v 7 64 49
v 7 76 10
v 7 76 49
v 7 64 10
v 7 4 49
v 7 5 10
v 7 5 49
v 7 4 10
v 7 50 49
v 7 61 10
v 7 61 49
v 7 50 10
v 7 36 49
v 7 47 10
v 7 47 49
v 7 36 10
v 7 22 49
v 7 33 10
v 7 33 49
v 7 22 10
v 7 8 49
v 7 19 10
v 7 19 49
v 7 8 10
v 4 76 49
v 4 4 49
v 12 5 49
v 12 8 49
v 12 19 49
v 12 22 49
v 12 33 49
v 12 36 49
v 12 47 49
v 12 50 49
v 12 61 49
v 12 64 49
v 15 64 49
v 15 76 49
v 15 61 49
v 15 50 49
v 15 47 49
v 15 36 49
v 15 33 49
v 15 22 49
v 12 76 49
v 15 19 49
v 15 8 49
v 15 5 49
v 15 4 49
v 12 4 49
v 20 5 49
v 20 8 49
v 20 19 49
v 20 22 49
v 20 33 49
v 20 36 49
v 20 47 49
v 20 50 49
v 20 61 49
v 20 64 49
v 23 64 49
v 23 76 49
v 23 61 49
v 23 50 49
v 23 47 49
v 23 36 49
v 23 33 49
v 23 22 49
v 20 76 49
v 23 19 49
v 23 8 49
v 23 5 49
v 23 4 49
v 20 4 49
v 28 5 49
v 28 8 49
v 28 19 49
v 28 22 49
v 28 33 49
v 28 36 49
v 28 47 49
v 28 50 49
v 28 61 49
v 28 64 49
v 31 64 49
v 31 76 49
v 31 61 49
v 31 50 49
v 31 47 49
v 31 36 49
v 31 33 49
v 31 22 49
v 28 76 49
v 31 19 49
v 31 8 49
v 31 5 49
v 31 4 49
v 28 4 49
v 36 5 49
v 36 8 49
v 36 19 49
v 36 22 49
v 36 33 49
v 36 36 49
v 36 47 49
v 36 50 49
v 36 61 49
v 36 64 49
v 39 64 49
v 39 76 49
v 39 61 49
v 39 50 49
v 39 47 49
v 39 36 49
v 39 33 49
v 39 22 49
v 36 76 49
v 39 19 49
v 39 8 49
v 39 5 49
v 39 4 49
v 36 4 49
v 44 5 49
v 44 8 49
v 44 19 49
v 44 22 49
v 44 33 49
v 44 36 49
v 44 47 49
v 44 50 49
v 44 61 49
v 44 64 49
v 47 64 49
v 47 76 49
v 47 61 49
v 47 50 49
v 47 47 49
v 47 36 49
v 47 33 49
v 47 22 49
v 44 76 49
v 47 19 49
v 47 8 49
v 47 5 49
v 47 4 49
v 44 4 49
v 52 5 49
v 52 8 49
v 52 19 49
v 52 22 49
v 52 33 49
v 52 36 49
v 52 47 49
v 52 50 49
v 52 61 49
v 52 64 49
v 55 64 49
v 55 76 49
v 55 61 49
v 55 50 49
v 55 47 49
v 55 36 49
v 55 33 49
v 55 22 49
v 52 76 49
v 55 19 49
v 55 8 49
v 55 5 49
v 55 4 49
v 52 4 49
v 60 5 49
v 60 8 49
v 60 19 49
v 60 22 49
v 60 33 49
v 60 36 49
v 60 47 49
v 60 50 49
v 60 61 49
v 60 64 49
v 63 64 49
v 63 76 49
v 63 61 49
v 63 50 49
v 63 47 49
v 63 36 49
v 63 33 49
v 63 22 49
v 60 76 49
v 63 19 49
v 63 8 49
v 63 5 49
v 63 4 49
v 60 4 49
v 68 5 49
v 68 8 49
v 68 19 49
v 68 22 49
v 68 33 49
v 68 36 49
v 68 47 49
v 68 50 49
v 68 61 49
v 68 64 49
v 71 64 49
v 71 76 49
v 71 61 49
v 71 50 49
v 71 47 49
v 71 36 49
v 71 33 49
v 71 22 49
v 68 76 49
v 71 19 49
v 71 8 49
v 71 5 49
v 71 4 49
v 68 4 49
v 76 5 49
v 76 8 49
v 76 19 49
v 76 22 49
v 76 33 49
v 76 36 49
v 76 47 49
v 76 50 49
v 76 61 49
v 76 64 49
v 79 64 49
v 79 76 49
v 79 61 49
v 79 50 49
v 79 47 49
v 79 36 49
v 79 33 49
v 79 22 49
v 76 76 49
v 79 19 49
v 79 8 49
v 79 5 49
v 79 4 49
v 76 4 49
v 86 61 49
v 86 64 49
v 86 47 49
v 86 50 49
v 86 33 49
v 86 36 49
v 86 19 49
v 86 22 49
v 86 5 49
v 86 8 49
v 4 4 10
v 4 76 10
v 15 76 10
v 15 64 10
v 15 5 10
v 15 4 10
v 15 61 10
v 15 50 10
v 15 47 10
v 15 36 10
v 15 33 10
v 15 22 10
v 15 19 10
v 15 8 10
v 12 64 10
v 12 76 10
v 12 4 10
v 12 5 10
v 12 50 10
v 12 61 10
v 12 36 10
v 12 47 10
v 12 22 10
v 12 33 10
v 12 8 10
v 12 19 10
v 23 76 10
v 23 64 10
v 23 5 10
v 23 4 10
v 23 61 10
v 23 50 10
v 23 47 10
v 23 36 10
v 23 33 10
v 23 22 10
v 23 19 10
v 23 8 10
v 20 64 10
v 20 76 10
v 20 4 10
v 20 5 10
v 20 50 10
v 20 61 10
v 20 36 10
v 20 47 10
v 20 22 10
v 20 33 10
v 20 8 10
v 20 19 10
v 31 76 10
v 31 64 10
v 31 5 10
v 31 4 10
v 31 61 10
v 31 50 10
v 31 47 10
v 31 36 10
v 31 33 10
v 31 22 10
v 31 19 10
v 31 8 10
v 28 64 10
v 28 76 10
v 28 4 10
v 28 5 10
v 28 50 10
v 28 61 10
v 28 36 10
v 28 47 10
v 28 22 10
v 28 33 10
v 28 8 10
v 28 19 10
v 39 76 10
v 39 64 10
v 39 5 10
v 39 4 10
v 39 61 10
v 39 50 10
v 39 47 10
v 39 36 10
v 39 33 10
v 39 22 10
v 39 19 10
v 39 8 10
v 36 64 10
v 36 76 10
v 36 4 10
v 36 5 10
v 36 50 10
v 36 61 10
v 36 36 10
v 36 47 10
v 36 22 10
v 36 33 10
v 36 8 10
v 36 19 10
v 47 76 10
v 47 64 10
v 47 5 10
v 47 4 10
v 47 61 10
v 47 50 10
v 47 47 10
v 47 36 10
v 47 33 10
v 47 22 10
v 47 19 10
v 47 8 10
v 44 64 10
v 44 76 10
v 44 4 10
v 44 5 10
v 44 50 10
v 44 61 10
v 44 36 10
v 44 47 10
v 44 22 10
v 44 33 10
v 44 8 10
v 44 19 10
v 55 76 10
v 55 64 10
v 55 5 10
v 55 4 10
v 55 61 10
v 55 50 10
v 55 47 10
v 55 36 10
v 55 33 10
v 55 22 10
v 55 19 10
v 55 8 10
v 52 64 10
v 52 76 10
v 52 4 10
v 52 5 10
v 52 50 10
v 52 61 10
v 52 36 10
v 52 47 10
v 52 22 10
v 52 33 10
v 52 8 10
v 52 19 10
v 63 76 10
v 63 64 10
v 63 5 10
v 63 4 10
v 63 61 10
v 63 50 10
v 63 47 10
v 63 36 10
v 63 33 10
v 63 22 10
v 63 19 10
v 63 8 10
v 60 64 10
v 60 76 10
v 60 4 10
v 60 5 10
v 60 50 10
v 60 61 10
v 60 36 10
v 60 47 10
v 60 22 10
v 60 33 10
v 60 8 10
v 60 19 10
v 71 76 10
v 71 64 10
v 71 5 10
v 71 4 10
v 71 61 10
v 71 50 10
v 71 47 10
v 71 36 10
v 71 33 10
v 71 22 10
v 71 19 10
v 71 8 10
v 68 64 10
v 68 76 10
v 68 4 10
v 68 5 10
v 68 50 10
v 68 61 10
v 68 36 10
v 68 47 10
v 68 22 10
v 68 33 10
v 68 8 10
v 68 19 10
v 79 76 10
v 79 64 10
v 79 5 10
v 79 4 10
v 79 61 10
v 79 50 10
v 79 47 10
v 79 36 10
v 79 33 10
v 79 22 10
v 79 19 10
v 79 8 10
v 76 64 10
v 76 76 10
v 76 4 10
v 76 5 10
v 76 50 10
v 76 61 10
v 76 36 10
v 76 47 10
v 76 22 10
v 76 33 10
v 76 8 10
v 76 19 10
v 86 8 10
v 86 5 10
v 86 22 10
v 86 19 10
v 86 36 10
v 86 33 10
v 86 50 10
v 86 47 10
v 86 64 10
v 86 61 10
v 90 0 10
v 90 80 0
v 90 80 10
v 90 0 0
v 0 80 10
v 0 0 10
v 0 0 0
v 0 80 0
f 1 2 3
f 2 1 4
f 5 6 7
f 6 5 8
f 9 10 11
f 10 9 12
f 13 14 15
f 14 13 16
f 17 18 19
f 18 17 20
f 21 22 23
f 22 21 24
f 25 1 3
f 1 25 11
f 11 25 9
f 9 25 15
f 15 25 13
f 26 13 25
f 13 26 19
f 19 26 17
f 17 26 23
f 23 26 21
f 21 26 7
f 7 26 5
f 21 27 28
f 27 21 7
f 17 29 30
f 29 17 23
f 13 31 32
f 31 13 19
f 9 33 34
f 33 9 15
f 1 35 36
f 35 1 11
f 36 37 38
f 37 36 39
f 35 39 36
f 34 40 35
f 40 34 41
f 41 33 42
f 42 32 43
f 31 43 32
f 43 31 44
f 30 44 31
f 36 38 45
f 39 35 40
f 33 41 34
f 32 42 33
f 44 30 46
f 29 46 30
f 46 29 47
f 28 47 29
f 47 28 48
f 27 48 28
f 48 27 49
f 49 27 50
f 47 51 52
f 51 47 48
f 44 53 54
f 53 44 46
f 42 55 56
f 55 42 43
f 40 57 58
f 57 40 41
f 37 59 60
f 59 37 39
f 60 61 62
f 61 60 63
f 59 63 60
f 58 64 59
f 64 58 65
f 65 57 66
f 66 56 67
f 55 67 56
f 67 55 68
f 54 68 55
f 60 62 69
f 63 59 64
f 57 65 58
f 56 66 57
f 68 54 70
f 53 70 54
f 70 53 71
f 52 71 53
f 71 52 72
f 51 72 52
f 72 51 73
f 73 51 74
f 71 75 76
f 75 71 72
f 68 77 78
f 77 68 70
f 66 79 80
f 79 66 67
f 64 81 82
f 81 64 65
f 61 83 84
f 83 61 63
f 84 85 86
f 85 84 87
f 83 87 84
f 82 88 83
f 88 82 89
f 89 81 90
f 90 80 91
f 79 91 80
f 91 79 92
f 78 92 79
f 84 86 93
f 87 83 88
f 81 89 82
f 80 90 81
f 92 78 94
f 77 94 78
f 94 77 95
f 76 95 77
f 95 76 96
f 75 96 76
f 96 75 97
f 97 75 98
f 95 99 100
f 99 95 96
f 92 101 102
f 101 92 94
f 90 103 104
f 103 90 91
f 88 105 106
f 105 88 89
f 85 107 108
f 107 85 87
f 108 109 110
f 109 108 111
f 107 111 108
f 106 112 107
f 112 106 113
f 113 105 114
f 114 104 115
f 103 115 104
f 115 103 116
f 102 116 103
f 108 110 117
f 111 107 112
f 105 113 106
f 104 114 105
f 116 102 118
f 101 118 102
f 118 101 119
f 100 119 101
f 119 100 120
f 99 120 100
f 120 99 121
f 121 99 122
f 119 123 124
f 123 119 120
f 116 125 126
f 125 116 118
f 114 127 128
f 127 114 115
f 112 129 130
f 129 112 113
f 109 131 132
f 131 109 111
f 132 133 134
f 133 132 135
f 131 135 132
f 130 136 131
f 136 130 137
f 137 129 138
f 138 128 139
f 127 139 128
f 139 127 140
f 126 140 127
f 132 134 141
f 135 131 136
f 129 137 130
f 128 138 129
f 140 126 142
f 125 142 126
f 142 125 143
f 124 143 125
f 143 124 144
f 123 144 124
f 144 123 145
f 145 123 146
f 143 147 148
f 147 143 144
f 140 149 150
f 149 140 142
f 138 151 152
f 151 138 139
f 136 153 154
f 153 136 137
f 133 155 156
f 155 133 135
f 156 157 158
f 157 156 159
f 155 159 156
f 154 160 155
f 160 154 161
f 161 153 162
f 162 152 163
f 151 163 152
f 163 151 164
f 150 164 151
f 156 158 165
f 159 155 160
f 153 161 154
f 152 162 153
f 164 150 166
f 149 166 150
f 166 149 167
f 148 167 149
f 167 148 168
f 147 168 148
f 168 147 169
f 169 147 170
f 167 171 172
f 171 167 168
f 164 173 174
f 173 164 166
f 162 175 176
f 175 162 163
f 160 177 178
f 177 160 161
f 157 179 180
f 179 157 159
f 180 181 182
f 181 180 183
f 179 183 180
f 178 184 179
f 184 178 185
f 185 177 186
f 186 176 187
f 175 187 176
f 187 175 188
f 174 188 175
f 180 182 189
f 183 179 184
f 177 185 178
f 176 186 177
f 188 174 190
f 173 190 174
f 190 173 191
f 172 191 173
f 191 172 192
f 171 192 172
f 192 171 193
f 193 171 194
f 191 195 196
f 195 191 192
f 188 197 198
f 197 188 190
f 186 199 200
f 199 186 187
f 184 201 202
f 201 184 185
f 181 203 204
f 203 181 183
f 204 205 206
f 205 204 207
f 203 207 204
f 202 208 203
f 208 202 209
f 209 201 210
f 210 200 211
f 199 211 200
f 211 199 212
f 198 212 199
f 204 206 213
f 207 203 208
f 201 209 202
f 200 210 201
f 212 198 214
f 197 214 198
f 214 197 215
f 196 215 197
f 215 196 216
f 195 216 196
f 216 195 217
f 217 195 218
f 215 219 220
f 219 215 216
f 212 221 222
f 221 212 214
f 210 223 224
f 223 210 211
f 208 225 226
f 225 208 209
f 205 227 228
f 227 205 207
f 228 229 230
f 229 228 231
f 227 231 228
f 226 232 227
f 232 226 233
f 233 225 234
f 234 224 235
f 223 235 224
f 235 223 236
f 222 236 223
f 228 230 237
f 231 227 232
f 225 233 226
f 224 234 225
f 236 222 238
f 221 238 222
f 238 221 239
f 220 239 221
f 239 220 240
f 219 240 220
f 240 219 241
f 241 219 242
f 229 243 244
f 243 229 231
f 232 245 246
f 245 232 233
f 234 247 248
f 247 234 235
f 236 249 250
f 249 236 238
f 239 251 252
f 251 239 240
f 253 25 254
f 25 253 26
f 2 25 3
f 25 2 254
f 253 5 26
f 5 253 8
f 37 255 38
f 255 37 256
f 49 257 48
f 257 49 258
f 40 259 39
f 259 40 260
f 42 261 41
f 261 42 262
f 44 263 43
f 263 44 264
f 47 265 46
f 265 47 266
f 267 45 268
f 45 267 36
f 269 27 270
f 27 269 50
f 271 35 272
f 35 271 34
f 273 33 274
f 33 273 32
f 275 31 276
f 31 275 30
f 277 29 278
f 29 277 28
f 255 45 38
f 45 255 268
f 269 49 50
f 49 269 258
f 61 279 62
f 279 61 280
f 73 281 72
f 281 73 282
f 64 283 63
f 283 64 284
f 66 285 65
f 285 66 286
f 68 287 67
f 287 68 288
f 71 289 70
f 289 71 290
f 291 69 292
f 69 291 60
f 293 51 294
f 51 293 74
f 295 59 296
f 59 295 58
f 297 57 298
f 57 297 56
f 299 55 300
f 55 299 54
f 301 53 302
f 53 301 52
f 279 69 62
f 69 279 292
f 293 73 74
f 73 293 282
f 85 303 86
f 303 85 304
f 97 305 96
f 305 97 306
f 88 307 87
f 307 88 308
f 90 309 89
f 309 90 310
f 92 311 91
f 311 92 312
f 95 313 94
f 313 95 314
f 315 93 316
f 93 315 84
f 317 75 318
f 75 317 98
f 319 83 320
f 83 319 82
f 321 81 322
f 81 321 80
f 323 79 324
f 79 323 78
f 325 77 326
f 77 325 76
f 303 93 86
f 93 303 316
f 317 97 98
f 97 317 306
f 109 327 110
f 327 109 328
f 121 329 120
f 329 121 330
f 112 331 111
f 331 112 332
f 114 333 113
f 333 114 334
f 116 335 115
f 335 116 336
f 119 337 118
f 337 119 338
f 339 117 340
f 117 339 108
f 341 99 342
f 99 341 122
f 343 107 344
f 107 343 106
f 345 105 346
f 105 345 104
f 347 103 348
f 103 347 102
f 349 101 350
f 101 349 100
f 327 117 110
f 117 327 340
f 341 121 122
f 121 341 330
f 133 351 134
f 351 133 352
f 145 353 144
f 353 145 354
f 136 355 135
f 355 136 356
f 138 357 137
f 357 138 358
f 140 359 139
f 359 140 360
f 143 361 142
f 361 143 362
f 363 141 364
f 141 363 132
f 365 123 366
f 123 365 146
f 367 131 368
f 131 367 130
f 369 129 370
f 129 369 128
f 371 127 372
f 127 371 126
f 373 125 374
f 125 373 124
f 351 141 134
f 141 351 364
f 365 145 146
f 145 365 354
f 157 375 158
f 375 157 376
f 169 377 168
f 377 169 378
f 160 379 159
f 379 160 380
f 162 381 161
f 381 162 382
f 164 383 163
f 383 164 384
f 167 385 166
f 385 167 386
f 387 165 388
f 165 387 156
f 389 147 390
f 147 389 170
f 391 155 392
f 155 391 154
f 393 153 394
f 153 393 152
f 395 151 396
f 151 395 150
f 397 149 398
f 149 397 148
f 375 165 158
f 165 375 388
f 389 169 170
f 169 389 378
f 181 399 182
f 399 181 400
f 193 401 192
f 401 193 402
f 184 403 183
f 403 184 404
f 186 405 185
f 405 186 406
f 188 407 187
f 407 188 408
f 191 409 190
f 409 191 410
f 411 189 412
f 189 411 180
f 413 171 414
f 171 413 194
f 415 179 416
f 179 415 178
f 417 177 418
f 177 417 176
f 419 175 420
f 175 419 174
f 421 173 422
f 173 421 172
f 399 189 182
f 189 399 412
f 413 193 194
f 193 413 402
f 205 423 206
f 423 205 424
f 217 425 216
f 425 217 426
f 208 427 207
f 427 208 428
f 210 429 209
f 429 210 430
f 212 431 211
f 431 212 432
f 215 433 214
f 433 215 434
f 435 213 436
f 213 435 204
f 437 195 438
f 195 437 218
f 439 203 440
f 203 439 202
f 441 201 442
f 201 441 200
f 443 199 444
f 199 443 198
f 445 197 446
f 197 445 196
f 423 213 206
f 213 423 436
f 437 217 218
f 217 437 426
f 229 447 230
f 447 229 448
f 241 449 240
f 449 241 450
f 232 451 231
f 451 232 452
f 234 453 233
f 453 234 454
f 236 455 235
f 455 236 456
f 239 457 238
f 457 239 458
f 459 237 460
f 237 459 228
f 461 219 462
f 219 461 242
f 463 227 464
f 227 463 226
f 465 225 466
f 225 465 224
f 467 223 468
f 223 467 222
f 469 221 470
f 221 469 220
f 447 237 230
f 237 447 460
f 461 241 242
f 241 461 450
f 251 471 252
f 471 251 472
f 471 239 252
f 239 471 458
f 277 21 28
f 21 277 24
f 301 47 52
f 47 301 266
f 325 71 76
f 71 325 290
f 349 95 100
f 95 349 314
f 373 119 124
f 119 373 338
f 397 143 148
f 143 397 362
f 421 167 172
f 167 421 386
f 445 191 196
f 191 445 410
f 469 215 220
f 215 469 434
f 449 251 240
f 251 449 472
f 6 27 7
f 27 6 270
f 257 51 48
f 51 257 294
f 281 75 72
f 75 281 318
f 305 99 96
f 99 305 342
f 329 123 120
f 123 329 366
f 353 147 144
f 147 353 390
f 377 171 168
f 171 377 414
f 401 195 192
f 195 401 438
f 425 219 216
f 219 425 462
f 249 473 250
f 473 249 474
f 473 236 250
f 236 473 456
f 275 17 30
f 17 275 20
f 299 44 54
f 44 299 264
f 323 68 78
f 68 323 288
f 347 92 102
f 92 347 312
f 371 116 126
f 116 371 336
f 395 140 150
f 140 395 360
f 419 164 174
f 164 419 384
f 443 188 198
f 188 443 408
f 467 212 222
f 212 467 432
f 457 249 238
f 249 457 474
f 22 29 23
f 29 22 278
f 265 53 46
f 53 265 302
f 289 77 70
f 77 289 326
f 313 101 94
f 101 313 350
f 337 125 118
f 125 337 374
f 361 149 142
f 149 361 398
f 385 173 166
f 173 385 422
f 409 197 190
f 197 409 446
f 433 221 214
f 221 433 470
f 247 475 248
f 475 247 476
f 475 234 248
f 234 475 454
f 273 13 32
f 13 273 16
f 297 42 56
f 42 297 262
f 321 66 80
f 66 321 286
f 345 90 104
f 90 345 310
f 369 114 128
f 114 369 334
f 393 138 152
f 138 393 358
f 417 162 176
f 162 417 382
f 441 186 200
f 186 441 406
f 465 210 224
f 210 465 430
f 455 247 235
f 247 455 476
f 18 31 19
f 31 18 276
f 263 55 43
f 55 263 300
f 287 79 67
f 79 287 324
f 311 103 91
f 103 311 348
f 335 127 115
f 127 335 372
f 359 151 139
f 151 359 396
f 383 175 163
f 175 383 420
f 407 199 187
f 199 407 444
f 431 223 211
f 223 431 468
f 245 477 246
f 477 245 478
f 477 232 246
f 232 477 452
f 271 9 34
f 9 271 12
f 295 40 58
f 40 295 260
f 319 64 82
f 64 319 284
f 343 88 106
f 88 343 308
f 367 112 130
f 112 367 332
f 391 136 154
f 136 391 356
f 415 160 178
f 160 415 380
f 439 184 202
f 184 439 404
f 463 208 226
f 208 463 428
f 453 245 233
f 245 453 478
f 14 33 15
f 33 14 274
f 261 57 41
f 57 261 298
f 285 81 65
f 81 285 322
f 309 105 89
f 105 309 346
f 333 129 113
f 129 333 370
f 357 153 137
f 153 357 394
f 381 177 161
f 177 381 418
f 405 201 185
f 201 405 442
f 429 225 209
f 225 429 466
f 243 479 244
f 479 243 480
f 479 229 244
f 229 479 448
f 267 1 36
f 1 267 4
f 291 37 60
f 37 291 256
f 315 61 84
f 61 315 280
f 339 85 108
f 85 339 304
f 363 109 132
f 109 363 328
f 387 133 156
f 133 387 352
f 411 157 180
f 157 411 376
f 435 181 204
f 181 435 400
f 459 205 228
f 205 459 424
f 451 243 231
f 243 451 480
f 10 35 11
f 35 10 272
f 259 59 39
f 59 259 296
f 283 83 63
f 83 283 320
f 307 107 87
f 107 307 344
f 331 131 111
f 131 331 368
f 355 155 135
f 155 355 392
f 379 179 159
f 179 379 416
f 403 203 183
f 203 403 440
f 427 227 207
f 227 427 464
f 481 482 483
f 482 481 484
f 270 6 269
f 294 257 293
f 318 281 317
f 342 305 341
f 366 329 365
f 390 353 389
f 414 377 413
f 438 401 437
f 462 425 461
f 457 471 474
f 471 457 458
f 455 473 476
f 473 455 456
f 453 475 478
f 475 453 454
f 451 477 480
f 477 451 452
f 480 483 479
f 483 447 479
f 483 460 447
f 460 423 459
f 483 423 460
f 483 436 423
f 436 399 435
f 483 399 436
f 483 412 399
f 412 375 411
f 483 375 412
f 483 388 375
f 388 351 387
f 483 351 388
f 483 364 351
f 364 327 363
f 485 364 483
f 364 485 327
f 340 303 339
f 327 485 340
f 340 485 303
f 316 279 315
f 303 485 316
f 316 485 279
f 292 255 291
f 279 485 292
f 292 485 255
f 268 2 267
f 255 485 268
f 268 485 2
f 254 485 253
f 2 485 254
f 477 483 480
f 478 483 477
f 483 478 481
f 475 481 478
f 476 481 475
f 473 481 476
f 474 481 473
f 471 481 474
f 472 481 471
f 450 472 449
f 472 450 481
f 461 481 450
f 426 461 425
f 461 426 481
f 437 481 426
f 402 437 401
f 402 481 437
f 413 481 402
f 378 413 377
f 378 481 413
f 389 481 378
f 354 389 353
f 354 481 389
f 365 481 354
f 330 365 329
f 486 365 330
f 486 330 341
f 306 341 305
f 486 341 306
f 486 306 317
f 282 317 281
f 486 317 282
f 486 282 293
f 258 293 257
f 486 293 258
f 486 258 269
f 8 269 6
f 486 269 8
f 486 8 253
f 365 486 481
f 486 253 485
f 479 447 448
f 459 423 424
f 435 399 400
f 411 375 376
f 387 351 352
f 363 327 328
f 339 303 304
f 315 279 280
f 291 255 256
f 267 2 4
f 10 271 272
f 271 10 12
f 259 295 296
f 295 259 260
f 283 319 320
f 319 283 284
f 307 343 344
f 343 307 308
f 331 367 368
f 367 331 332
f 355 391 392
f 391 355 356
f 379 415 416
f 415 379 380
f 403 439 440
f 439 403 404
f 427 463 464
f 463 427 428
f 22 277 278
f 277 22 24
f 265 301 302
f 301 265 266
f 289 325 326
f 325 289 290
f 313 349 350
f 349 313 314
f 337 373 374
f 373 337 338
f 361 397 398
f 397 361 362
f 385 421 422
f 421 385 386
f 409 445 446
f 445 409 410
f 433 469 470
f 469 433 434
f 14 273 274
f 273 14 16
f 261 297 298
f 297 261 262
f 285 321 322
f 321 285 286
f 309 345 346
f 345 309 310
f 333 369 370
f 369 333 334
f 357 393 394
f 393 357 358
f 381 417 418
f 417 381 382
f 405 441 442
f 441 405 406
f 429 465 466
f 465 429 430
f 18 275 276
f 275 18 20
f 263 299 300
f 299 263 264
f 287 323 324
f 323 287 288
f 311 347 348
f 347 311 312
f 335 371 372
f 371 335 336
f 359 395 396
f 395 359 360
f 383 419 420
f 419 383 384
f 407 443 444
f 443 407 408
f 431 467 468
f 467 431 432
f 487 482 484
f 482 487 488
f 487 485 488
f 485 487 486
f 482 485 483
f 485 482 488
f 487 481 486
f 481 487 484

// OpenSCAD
$fn = 32;

// ----------------------------------------------------------------------
// Heatsink: cross fin block
// ----------------------------------------------------------------------

// --- parameters (mm) ---
base_l = 90;              // base length, X
base_w = 80;              // base width, Y
base_t = 10;              // base plate thickness
fin_h = 40;               // fin height above the base
fin_t = 3;                // fin thickness
edge = 4;                 // margin from the base ends
pitch = 8;                // fin pitch
rib_pitch = 14;           // cross rib pitch

n_fins = floor((base_l - 2 * edge - fin_t) / pitch) + 1;  // fin count
total_h = base_t + fin_h - 1;  // overall height
n_ribs = floor((base_w - 2 * edge) / rib_pitch);  // rib count

union() {
  cube([base_l, base_w, base_t]);
  for (i = [0 : n_fins - 1])
    translate([edge + i * pitch, edge, base_t - 1])
      cube([fin_t, base_w - 2 * edge, fin_h]);
  for (i = [0 : n_ribs - 1])
    translate([edge, edge + 1 + i * rib_pitch, base_t - 1])
      cube([base_l - 2 * edge, fin_t, fin_h]);
}
